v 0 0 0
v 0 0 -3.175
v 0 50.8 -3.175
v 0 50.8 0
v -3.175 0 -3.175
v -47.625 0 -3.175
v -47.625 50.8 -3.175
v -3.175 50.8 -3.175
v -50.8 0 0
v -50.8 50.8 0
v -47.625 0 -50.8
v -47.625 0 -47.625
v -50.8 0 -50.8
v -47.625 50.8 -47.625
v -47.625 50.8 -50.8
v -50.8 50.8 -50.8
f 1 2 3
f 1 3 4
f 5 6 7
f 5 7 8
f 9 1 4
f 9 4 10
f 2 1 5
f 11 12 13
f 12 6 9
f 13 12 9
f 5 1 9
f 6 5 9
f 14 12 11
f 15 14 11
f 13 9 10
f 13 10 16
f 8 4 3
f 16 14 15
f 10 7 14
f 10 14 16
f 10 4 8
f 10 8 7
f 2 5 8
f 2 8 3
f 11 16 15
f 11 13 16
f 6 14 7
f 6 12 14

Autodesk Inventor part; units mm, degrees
ref_plane "YZ Plane" through (0, 0, 0) normal (1, 0, 0) x (0, 1, 0)
ref_plane "XZ Plane" through (0, 0, 0) normal (0, 1, 0) x (-1, 0, 0)
ref_plane "XY Plane" through (0, 0, 0) normal (0, 0, 1) x (1, 0, 0)
sketch "Sketch1" plane through (0, 0, 0) normal (0, 1, 0) x (-1, 0, 0)
  point P0 (0, 0)
sketch "Sketch2" plane through (0, 0, 0) normal (0, 1, 0) x (-1, 0, 0)
  line L0 (0, 0) -> (50.8, 0)
  line L1 (50.8, 0) -> (50.8, -50.8)
  line L2 (50.8, -50.8) -> (0, -50.8)
  line L3 (0, -50.8) -> (0, 0)
  line L4 (47.625, -47.625) -> (47.625, -3.175)
  line L5 (47.625, -3.175) -> (3.175, -3.175)
  line L6 (3.175, -3.175) -> (3.175, -47.625)
  line L7 (3.175, -47.625) -> (47.625, -47.625)
  line L8 (3.175, -3.175) -> (0, -3.175)
  line L9 (47.625, -47.625) -> (47.625, -50.8)
  dimension "d0" = 50.8
  dimension "d1" = 50.8
  dimension "d2" = 3.175
extrude "Extrusion1" add sketch "Sketch2" along normal blind 50.8 contours L0 L1 L2 L9 L4 L5 L8 L3
properties part number "AluminumBracket" material "Aluminum 6061"
